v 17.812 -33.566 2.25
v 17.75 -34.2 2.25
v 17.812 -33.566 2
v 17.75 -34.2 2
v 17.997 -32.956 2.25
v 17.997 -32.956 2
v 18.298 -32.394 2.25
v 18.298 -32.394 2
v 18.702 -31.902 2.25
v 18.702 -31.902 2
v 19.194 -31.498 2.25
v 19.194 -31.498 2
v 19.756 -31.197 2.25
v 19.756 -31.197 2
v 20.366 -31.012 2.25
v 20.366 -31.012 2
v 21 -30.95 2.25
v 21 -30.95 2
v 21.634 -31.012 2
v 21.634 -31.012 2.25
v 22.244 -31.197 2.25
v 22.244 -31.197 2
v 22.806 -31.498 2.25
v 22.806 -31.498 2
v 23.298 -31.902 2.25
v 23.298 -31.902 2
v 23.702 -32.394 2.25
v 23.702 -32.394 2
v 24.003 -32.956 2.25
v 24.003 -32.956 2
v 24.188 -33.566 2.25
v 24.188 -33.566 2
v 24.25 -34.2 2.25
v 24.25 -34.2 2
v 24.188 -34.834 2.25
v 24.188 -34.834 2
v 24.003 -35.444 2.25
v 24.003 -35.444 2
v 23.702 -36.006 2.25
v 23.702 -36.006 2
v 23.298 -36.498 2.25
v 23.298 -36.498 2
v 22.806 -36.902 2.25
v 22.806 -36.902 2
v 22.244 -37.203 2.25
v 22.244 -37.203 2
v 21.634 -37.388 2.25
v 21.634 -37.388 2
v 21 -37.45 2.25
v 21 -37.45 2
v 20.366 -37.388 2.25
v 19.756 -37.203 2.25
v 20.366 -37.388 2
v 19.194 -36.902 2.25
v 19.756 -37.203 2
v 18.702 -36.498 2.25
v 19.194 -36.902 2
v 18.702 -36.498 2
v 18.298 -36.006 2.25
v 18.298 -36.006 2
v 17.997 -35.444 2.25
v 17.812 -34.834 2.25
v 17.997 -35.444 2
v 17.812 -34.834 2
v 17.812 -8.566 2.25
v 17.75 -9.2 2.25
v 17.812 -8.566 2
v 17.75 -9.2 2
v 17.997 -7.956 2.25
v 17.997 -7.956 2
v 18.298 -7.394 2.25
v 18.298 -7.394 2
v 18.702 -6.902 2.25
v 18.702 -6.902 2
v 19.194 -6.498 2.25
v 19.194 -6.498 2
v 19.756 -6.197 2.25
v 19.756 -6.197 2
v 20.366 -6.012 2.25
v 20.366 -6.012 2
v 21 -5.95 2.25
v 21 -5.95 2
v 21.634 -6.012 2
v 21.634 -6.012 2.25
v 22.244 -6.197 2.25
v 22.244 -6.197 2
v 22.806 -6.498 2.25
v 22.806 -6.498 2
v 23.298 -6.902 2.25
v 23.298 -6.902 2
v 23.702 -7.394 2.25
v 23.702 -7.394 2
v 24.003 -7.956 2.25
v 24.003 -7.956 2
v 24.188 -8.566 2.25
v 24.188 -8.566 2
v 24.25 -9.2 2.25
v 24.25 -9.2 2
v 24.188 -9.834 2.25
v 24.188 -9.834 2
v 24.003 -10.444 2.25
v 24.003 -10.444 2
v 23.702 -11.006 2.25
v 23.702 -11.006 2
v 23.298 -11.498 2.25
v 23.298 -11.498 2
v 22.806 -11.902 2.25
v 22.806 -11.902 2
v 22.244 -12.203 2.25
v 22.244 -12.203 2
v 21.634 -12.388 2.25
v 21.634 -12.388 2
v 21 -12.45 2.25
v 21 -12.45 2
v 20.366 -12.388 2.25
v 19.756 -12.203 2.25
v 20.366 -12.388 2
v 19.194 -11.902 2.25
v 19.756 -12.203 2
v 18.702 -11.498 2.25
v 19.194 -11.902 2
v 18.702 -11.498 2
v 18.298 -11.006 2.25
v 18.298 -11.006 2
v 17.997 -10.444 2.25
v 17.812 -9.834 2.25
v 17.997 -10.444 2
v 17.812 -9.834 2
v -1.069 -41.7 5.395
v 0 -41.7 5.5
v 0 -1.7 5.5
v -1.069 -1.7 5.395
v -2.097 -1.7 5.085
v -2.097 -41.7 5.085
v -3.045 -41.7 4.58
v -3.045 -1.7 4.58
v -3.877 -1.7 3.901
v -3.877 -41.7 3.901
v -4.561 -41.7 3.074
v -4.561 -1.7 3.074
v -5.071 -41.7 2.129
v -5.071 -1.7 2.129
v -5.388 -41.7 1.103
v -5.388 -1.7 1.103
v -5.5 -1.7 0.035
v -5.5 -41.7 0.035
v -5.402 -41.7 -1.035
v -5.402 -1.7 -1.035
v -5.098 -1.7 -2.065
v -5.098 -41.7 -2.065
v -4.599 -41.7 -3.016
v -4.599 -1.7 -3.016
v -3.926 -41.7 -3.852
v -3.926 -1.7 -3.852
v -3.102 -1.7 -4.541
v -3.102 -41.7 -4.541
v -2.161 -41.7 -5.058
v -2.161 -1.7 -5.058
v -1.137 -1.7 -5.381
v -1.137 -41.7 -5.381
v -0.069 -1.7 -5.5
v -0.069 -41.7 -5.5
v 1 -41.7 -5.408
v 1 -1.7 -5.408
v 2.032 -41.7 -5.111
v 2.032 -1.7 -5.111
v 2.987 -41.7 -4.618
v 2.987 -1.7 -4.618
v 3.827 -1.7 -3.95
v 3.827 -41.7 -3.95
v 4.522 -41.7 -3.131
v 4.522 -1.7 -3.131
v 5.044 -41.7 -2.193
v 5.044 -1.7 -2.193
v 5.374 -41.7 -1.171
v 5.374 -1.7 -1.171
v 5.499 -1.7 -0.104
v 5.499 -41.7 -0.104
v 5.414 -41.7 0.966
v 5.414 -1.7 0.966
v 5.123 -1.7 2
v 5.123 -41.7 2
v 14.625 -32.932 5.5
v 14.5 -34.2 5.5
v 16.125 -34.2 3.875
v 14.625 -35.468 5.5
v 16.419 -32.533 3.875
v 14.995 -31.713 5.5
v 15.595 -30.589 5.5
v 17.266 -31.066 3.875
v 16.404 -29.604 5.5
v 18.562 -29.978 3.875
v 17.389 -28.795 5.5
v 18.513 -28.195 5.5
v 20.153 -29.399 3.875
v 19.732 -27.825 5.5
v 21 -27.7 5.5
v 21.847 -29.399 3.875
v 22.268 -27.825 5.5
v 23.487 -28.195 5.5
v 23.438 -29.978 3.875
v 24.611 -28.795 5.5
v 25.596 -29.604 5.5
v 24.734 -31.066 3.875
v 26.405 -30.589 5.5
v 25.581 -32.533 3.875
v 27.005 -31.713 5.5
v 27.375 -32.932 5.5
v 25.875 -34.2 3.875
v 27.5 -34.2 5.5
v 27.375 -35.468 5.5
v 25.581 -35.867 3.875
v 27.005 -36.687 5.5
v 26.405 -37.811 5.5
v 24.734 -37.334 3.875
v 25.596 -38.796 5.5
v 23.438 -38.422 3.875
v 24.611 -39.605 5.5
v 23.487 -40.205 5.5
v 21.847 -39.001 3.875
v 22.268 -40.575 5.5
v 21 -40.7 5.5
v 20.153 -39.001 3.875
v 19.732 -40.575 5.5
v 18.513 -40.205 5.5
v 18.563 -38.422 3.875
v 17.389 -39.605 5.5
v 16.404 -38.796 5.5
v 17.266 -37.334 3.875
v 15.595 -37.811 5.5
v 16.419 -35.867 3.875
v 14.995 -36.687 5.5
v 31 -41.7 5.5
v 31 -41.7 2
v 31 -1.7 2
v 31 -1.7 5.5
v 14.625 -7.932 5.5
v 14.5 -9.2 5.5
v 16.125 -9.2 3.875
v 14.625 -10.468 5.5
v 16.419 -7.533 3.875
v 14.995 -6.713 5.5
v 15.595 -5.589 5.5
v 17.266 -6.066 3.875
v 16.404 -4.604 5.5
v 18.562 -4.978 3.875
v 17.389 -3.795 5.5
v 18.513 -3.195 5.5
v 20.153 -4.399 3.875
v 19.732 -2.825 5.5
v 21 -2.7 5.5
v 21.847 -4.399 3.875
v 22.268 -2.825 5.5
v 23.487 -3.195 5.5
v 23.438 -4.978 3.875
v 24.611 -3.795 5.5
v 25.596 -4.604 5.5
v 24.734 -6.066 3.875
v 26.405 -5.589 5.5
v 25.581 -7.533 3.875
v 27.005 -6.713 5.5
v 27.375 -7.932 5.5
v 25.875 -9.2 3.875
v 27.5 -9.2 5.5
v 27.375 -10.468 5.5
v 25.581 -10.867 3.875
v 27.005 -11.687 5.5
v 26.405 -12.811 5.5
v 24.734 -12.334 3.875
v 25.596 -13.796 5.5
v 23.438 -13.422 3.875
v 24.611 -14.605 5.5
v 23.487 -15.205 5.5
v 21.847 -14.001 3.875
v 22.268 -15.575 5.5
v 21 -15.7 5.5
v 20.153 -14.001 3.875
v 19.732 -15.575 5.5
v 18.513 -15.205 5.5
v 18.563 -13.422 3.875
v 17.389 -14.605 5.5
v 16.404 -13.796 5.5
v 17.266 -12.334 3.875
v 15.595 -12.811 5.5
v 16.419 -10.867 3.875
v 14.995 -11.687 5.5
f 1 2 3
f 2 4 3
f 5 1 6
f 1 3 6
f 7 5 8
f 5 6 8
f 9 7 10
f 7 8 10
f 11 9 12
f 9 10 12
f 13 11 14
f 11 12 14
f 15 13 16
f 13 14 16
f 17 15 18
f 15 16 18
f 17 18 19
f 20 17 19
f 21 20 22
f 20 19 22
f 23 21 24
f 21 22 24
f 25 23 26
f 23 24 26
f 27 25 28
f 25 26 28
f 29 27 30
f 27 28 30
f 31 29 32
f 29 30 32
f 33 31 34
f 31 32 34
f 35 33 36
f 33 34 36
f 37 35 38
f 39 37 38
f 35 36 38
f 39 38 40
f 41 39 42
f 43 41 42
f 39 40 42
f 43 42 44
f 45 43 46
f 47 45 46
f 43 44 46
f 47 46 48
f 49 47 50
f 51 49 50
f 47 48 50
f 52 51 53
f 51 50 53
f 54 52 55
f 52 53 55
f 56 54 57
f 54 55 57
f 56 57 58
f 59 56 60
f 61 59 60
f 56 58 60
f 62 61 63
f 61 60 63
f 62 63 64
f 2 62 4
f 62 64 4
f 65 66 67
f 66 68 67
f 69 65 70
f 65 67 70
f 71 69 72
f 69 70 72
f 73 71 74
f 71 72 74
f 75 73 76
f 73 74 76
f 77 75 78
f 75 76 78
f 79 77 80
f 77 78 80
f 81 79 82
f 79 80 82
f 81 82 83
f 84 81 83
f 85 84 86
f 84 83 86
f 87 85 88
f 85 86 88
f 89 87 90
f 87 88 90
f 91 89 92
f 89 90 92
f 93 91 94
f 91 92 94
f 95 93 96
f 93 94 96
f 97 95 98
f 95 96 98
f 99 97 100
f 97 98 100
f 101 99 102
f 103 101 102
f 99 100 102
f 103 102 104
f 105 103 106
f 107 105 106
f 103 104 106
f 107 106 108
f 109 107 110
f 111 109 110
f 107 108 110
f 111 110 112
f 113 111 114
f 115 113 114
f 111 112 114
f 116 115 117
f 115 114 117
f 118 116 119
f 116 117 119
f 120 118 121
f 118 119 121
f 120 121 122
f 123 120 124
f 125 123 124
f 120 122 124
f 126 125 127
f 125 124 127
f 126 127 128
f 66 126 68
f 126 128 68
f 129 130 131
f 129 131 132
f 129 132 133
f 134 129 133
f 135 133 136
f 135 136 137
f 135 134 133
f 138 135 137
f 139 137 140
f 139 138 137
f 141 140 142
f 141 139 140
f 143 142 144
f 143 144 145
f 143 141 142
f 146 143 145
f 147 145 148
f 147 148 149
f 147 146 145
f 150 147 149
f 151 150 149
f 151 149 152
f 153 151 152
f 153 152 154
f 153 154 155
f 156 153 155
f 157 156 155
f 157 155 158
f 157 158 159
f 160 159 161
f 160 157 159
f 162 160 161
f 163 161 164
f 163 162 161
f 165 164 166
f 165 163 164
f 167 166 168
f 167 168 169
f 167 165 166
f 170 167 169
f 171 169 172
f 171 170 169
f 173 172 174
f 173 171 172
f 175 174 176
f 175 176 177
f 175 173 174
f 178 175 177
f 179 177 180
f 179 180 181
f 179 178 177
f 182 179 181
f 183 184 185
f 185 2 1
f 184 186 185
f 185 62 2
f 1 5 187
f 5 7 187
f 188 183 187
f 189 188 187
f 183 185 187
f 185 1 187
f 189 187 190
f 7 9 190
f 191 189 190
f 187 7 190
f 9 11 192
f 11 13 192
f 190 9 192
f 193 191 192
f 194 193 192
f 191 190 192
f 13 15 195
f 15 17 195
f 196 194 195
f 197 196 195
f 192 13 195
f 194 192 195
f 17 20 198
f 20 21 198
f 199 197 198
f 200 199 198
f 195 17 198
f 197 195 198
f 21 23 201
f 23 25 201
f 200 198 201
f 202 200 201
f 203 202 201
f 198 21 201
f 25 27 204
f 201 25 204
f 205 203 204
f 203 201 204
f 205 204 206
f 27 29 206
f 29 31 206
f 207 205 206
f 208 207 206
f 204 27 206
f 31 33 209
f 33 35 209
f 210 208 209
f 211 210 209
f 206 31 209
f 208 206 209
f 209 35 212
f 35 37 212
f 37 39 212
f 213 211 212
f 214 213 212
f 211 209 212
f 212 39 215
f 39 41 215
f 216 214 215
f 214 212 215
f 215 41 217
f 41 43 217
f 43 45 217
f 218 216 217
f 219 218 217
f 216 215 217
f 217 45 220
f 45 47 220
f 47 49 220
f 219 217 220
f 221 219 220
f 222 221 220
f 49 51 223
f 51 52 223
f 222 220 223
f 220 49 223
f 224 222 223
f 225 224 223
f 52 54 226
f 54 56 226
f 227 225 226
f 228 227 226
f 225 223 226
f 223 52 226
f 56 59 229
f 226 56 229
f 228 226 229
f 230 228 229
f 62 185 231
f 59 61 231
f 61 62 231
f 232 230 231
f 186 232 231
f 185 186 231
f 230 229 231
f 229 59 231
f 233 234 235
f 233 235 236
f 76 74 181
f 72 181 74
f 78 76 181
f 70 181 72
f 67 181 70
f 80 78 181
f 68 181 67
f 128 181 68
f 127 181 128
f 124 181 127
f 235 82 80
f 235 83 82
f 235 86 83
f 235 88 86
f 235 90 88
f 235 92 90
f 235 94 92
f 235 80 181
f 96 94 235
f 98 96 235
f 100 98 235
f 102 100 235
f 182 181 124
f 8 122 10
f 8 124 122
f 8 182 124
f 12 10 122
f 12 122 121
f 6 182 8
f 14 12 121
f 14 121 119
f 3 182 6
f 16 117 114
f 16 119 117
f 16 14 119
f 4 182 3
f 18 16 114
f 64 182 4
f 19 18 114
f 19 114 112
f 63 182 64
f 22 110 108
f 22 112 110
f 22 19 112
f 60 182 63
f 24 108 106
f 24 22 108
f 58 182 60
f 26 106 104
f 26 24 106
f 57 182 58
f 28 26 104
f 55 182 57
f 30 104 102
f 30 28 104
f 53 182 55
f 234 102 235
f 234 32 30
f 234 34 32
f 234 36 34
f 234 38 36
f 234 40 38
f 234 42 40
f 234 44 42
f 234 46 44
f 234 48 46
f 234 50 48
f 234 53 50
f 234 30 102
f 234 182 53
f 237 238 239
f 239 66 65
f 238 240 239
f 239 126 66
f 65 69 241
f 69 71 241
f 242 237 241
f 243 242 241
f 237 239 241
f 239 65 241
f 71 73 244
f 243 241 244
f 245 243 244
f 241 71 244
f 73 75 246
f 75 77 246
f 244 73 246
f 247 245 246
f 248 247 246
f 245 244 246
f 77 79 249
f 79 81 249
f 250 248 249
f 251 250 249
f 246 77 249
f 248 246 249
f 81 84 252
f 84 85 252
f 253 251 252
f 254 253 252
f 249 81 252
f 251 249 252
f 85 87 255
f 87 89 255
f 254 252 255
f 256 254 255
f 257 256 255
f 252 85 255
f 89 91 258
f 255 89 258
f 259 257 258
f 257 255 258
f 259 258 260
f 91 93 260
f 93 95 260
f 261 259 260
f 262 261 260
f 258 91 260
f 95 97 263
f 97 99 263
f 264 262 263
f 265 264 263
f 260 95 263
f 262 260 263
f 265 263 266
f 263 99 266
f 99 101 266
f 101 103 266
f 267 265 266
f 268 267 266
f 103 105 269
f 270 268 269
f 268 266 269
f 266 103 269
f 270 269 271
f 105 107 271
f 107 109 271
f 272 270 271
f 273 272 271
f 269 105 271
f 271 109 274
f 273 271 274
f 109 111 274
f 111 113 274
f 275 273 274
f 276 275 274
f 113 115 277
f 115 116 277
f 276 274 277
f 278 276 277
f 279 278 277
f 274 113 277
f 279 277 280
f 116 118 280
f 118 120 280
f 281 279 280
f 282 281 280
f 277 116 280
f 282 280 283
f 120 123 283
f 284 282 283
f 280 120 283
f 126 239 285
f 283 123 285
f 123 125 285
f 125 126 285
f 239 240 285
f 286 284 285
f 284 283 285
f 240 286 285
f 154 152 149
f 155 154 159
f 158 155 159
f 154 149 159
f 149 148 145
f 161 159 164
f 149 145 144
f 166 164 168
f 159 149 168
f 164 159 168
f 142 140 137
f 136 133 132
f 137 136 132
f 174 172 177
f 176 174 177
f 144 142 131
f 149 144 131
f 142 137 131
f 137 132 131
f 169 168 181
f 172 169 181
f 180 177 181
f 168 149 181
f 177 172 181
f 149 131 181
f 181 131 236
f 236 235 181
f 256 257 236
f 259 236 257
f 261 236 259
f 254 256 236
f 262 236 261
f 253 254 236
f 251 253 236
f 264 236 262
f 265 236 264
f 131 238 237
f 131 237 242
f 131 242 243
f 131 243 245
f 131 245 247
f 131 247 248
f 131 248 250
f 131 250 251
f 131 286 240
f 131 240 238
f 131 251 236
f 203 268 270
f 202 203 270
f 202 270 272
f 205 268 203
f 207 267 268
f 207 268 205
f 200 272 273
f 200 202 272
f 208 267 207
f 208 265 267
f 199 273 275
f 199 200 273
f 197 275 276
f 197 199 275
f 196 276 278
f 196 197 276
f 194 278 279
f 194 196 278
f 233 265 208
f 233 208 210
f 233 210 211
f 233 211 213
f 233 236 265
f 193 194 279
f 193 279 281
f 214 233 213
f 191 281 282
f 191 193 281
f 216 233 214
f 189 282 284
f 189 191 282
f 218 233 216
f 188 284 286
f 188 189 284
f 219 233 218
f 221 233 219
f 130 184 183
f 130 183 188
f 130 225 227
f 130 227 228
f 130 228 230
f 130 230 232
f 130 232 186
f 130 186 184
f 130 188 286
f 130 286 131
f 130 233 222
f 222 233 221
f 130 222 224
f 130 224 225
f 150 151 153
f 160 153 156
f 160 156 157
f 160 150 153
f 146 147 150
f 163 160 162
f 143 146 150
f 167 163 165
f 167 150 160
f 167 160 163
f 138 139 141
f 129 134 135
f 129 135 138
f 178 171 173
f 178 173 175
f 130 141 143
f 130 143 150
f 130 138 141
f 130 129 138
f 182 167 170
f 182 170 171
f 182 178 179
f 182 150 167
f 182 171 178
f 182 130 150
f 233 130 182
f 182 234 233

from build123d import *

# Parameters (mm, degrees)
EXTRUDE1_DEPTH       = 40
HOLEWZD1_D           = 6.5
HOLEWZD1_DEPTH       = 11
HOLEWZD1_CSINK_D     = 13
HOLEWZD1_CSINK_ANGLE = 90


with BuildPart() as part:
    # Sketch1 → Extrude1 (new body)
    with BuildSketch(Plane.XZ.offset(41.7)):
        with BuildLine():
            Line((31, 5.5), (0, 5.5))
            ThreePointArc((0, 5.5), (-3.102418411, -4.541475531), (5.123475383, 2))
            Line((5.123475383, 2), (31, 2))
            Line((31, 2), (31, 5.5))
        make_face()
    extrude(amount=-EXTRUDE1_DEPTH)

    # HoleWzd1
    with Locations(Plane.XY.offset(5.5)):
        with Locations((21, -34.2), (21, -9.2)):
            CounterSinkHole(HOLEWZD1_D / 2, HOLEWZD1_CSINK_D / 2, depth=HOLEWZD1_DEPTH, counter_sink_angle=HOLEWZD1_CSINK_ANGLE)


solid = part.part
